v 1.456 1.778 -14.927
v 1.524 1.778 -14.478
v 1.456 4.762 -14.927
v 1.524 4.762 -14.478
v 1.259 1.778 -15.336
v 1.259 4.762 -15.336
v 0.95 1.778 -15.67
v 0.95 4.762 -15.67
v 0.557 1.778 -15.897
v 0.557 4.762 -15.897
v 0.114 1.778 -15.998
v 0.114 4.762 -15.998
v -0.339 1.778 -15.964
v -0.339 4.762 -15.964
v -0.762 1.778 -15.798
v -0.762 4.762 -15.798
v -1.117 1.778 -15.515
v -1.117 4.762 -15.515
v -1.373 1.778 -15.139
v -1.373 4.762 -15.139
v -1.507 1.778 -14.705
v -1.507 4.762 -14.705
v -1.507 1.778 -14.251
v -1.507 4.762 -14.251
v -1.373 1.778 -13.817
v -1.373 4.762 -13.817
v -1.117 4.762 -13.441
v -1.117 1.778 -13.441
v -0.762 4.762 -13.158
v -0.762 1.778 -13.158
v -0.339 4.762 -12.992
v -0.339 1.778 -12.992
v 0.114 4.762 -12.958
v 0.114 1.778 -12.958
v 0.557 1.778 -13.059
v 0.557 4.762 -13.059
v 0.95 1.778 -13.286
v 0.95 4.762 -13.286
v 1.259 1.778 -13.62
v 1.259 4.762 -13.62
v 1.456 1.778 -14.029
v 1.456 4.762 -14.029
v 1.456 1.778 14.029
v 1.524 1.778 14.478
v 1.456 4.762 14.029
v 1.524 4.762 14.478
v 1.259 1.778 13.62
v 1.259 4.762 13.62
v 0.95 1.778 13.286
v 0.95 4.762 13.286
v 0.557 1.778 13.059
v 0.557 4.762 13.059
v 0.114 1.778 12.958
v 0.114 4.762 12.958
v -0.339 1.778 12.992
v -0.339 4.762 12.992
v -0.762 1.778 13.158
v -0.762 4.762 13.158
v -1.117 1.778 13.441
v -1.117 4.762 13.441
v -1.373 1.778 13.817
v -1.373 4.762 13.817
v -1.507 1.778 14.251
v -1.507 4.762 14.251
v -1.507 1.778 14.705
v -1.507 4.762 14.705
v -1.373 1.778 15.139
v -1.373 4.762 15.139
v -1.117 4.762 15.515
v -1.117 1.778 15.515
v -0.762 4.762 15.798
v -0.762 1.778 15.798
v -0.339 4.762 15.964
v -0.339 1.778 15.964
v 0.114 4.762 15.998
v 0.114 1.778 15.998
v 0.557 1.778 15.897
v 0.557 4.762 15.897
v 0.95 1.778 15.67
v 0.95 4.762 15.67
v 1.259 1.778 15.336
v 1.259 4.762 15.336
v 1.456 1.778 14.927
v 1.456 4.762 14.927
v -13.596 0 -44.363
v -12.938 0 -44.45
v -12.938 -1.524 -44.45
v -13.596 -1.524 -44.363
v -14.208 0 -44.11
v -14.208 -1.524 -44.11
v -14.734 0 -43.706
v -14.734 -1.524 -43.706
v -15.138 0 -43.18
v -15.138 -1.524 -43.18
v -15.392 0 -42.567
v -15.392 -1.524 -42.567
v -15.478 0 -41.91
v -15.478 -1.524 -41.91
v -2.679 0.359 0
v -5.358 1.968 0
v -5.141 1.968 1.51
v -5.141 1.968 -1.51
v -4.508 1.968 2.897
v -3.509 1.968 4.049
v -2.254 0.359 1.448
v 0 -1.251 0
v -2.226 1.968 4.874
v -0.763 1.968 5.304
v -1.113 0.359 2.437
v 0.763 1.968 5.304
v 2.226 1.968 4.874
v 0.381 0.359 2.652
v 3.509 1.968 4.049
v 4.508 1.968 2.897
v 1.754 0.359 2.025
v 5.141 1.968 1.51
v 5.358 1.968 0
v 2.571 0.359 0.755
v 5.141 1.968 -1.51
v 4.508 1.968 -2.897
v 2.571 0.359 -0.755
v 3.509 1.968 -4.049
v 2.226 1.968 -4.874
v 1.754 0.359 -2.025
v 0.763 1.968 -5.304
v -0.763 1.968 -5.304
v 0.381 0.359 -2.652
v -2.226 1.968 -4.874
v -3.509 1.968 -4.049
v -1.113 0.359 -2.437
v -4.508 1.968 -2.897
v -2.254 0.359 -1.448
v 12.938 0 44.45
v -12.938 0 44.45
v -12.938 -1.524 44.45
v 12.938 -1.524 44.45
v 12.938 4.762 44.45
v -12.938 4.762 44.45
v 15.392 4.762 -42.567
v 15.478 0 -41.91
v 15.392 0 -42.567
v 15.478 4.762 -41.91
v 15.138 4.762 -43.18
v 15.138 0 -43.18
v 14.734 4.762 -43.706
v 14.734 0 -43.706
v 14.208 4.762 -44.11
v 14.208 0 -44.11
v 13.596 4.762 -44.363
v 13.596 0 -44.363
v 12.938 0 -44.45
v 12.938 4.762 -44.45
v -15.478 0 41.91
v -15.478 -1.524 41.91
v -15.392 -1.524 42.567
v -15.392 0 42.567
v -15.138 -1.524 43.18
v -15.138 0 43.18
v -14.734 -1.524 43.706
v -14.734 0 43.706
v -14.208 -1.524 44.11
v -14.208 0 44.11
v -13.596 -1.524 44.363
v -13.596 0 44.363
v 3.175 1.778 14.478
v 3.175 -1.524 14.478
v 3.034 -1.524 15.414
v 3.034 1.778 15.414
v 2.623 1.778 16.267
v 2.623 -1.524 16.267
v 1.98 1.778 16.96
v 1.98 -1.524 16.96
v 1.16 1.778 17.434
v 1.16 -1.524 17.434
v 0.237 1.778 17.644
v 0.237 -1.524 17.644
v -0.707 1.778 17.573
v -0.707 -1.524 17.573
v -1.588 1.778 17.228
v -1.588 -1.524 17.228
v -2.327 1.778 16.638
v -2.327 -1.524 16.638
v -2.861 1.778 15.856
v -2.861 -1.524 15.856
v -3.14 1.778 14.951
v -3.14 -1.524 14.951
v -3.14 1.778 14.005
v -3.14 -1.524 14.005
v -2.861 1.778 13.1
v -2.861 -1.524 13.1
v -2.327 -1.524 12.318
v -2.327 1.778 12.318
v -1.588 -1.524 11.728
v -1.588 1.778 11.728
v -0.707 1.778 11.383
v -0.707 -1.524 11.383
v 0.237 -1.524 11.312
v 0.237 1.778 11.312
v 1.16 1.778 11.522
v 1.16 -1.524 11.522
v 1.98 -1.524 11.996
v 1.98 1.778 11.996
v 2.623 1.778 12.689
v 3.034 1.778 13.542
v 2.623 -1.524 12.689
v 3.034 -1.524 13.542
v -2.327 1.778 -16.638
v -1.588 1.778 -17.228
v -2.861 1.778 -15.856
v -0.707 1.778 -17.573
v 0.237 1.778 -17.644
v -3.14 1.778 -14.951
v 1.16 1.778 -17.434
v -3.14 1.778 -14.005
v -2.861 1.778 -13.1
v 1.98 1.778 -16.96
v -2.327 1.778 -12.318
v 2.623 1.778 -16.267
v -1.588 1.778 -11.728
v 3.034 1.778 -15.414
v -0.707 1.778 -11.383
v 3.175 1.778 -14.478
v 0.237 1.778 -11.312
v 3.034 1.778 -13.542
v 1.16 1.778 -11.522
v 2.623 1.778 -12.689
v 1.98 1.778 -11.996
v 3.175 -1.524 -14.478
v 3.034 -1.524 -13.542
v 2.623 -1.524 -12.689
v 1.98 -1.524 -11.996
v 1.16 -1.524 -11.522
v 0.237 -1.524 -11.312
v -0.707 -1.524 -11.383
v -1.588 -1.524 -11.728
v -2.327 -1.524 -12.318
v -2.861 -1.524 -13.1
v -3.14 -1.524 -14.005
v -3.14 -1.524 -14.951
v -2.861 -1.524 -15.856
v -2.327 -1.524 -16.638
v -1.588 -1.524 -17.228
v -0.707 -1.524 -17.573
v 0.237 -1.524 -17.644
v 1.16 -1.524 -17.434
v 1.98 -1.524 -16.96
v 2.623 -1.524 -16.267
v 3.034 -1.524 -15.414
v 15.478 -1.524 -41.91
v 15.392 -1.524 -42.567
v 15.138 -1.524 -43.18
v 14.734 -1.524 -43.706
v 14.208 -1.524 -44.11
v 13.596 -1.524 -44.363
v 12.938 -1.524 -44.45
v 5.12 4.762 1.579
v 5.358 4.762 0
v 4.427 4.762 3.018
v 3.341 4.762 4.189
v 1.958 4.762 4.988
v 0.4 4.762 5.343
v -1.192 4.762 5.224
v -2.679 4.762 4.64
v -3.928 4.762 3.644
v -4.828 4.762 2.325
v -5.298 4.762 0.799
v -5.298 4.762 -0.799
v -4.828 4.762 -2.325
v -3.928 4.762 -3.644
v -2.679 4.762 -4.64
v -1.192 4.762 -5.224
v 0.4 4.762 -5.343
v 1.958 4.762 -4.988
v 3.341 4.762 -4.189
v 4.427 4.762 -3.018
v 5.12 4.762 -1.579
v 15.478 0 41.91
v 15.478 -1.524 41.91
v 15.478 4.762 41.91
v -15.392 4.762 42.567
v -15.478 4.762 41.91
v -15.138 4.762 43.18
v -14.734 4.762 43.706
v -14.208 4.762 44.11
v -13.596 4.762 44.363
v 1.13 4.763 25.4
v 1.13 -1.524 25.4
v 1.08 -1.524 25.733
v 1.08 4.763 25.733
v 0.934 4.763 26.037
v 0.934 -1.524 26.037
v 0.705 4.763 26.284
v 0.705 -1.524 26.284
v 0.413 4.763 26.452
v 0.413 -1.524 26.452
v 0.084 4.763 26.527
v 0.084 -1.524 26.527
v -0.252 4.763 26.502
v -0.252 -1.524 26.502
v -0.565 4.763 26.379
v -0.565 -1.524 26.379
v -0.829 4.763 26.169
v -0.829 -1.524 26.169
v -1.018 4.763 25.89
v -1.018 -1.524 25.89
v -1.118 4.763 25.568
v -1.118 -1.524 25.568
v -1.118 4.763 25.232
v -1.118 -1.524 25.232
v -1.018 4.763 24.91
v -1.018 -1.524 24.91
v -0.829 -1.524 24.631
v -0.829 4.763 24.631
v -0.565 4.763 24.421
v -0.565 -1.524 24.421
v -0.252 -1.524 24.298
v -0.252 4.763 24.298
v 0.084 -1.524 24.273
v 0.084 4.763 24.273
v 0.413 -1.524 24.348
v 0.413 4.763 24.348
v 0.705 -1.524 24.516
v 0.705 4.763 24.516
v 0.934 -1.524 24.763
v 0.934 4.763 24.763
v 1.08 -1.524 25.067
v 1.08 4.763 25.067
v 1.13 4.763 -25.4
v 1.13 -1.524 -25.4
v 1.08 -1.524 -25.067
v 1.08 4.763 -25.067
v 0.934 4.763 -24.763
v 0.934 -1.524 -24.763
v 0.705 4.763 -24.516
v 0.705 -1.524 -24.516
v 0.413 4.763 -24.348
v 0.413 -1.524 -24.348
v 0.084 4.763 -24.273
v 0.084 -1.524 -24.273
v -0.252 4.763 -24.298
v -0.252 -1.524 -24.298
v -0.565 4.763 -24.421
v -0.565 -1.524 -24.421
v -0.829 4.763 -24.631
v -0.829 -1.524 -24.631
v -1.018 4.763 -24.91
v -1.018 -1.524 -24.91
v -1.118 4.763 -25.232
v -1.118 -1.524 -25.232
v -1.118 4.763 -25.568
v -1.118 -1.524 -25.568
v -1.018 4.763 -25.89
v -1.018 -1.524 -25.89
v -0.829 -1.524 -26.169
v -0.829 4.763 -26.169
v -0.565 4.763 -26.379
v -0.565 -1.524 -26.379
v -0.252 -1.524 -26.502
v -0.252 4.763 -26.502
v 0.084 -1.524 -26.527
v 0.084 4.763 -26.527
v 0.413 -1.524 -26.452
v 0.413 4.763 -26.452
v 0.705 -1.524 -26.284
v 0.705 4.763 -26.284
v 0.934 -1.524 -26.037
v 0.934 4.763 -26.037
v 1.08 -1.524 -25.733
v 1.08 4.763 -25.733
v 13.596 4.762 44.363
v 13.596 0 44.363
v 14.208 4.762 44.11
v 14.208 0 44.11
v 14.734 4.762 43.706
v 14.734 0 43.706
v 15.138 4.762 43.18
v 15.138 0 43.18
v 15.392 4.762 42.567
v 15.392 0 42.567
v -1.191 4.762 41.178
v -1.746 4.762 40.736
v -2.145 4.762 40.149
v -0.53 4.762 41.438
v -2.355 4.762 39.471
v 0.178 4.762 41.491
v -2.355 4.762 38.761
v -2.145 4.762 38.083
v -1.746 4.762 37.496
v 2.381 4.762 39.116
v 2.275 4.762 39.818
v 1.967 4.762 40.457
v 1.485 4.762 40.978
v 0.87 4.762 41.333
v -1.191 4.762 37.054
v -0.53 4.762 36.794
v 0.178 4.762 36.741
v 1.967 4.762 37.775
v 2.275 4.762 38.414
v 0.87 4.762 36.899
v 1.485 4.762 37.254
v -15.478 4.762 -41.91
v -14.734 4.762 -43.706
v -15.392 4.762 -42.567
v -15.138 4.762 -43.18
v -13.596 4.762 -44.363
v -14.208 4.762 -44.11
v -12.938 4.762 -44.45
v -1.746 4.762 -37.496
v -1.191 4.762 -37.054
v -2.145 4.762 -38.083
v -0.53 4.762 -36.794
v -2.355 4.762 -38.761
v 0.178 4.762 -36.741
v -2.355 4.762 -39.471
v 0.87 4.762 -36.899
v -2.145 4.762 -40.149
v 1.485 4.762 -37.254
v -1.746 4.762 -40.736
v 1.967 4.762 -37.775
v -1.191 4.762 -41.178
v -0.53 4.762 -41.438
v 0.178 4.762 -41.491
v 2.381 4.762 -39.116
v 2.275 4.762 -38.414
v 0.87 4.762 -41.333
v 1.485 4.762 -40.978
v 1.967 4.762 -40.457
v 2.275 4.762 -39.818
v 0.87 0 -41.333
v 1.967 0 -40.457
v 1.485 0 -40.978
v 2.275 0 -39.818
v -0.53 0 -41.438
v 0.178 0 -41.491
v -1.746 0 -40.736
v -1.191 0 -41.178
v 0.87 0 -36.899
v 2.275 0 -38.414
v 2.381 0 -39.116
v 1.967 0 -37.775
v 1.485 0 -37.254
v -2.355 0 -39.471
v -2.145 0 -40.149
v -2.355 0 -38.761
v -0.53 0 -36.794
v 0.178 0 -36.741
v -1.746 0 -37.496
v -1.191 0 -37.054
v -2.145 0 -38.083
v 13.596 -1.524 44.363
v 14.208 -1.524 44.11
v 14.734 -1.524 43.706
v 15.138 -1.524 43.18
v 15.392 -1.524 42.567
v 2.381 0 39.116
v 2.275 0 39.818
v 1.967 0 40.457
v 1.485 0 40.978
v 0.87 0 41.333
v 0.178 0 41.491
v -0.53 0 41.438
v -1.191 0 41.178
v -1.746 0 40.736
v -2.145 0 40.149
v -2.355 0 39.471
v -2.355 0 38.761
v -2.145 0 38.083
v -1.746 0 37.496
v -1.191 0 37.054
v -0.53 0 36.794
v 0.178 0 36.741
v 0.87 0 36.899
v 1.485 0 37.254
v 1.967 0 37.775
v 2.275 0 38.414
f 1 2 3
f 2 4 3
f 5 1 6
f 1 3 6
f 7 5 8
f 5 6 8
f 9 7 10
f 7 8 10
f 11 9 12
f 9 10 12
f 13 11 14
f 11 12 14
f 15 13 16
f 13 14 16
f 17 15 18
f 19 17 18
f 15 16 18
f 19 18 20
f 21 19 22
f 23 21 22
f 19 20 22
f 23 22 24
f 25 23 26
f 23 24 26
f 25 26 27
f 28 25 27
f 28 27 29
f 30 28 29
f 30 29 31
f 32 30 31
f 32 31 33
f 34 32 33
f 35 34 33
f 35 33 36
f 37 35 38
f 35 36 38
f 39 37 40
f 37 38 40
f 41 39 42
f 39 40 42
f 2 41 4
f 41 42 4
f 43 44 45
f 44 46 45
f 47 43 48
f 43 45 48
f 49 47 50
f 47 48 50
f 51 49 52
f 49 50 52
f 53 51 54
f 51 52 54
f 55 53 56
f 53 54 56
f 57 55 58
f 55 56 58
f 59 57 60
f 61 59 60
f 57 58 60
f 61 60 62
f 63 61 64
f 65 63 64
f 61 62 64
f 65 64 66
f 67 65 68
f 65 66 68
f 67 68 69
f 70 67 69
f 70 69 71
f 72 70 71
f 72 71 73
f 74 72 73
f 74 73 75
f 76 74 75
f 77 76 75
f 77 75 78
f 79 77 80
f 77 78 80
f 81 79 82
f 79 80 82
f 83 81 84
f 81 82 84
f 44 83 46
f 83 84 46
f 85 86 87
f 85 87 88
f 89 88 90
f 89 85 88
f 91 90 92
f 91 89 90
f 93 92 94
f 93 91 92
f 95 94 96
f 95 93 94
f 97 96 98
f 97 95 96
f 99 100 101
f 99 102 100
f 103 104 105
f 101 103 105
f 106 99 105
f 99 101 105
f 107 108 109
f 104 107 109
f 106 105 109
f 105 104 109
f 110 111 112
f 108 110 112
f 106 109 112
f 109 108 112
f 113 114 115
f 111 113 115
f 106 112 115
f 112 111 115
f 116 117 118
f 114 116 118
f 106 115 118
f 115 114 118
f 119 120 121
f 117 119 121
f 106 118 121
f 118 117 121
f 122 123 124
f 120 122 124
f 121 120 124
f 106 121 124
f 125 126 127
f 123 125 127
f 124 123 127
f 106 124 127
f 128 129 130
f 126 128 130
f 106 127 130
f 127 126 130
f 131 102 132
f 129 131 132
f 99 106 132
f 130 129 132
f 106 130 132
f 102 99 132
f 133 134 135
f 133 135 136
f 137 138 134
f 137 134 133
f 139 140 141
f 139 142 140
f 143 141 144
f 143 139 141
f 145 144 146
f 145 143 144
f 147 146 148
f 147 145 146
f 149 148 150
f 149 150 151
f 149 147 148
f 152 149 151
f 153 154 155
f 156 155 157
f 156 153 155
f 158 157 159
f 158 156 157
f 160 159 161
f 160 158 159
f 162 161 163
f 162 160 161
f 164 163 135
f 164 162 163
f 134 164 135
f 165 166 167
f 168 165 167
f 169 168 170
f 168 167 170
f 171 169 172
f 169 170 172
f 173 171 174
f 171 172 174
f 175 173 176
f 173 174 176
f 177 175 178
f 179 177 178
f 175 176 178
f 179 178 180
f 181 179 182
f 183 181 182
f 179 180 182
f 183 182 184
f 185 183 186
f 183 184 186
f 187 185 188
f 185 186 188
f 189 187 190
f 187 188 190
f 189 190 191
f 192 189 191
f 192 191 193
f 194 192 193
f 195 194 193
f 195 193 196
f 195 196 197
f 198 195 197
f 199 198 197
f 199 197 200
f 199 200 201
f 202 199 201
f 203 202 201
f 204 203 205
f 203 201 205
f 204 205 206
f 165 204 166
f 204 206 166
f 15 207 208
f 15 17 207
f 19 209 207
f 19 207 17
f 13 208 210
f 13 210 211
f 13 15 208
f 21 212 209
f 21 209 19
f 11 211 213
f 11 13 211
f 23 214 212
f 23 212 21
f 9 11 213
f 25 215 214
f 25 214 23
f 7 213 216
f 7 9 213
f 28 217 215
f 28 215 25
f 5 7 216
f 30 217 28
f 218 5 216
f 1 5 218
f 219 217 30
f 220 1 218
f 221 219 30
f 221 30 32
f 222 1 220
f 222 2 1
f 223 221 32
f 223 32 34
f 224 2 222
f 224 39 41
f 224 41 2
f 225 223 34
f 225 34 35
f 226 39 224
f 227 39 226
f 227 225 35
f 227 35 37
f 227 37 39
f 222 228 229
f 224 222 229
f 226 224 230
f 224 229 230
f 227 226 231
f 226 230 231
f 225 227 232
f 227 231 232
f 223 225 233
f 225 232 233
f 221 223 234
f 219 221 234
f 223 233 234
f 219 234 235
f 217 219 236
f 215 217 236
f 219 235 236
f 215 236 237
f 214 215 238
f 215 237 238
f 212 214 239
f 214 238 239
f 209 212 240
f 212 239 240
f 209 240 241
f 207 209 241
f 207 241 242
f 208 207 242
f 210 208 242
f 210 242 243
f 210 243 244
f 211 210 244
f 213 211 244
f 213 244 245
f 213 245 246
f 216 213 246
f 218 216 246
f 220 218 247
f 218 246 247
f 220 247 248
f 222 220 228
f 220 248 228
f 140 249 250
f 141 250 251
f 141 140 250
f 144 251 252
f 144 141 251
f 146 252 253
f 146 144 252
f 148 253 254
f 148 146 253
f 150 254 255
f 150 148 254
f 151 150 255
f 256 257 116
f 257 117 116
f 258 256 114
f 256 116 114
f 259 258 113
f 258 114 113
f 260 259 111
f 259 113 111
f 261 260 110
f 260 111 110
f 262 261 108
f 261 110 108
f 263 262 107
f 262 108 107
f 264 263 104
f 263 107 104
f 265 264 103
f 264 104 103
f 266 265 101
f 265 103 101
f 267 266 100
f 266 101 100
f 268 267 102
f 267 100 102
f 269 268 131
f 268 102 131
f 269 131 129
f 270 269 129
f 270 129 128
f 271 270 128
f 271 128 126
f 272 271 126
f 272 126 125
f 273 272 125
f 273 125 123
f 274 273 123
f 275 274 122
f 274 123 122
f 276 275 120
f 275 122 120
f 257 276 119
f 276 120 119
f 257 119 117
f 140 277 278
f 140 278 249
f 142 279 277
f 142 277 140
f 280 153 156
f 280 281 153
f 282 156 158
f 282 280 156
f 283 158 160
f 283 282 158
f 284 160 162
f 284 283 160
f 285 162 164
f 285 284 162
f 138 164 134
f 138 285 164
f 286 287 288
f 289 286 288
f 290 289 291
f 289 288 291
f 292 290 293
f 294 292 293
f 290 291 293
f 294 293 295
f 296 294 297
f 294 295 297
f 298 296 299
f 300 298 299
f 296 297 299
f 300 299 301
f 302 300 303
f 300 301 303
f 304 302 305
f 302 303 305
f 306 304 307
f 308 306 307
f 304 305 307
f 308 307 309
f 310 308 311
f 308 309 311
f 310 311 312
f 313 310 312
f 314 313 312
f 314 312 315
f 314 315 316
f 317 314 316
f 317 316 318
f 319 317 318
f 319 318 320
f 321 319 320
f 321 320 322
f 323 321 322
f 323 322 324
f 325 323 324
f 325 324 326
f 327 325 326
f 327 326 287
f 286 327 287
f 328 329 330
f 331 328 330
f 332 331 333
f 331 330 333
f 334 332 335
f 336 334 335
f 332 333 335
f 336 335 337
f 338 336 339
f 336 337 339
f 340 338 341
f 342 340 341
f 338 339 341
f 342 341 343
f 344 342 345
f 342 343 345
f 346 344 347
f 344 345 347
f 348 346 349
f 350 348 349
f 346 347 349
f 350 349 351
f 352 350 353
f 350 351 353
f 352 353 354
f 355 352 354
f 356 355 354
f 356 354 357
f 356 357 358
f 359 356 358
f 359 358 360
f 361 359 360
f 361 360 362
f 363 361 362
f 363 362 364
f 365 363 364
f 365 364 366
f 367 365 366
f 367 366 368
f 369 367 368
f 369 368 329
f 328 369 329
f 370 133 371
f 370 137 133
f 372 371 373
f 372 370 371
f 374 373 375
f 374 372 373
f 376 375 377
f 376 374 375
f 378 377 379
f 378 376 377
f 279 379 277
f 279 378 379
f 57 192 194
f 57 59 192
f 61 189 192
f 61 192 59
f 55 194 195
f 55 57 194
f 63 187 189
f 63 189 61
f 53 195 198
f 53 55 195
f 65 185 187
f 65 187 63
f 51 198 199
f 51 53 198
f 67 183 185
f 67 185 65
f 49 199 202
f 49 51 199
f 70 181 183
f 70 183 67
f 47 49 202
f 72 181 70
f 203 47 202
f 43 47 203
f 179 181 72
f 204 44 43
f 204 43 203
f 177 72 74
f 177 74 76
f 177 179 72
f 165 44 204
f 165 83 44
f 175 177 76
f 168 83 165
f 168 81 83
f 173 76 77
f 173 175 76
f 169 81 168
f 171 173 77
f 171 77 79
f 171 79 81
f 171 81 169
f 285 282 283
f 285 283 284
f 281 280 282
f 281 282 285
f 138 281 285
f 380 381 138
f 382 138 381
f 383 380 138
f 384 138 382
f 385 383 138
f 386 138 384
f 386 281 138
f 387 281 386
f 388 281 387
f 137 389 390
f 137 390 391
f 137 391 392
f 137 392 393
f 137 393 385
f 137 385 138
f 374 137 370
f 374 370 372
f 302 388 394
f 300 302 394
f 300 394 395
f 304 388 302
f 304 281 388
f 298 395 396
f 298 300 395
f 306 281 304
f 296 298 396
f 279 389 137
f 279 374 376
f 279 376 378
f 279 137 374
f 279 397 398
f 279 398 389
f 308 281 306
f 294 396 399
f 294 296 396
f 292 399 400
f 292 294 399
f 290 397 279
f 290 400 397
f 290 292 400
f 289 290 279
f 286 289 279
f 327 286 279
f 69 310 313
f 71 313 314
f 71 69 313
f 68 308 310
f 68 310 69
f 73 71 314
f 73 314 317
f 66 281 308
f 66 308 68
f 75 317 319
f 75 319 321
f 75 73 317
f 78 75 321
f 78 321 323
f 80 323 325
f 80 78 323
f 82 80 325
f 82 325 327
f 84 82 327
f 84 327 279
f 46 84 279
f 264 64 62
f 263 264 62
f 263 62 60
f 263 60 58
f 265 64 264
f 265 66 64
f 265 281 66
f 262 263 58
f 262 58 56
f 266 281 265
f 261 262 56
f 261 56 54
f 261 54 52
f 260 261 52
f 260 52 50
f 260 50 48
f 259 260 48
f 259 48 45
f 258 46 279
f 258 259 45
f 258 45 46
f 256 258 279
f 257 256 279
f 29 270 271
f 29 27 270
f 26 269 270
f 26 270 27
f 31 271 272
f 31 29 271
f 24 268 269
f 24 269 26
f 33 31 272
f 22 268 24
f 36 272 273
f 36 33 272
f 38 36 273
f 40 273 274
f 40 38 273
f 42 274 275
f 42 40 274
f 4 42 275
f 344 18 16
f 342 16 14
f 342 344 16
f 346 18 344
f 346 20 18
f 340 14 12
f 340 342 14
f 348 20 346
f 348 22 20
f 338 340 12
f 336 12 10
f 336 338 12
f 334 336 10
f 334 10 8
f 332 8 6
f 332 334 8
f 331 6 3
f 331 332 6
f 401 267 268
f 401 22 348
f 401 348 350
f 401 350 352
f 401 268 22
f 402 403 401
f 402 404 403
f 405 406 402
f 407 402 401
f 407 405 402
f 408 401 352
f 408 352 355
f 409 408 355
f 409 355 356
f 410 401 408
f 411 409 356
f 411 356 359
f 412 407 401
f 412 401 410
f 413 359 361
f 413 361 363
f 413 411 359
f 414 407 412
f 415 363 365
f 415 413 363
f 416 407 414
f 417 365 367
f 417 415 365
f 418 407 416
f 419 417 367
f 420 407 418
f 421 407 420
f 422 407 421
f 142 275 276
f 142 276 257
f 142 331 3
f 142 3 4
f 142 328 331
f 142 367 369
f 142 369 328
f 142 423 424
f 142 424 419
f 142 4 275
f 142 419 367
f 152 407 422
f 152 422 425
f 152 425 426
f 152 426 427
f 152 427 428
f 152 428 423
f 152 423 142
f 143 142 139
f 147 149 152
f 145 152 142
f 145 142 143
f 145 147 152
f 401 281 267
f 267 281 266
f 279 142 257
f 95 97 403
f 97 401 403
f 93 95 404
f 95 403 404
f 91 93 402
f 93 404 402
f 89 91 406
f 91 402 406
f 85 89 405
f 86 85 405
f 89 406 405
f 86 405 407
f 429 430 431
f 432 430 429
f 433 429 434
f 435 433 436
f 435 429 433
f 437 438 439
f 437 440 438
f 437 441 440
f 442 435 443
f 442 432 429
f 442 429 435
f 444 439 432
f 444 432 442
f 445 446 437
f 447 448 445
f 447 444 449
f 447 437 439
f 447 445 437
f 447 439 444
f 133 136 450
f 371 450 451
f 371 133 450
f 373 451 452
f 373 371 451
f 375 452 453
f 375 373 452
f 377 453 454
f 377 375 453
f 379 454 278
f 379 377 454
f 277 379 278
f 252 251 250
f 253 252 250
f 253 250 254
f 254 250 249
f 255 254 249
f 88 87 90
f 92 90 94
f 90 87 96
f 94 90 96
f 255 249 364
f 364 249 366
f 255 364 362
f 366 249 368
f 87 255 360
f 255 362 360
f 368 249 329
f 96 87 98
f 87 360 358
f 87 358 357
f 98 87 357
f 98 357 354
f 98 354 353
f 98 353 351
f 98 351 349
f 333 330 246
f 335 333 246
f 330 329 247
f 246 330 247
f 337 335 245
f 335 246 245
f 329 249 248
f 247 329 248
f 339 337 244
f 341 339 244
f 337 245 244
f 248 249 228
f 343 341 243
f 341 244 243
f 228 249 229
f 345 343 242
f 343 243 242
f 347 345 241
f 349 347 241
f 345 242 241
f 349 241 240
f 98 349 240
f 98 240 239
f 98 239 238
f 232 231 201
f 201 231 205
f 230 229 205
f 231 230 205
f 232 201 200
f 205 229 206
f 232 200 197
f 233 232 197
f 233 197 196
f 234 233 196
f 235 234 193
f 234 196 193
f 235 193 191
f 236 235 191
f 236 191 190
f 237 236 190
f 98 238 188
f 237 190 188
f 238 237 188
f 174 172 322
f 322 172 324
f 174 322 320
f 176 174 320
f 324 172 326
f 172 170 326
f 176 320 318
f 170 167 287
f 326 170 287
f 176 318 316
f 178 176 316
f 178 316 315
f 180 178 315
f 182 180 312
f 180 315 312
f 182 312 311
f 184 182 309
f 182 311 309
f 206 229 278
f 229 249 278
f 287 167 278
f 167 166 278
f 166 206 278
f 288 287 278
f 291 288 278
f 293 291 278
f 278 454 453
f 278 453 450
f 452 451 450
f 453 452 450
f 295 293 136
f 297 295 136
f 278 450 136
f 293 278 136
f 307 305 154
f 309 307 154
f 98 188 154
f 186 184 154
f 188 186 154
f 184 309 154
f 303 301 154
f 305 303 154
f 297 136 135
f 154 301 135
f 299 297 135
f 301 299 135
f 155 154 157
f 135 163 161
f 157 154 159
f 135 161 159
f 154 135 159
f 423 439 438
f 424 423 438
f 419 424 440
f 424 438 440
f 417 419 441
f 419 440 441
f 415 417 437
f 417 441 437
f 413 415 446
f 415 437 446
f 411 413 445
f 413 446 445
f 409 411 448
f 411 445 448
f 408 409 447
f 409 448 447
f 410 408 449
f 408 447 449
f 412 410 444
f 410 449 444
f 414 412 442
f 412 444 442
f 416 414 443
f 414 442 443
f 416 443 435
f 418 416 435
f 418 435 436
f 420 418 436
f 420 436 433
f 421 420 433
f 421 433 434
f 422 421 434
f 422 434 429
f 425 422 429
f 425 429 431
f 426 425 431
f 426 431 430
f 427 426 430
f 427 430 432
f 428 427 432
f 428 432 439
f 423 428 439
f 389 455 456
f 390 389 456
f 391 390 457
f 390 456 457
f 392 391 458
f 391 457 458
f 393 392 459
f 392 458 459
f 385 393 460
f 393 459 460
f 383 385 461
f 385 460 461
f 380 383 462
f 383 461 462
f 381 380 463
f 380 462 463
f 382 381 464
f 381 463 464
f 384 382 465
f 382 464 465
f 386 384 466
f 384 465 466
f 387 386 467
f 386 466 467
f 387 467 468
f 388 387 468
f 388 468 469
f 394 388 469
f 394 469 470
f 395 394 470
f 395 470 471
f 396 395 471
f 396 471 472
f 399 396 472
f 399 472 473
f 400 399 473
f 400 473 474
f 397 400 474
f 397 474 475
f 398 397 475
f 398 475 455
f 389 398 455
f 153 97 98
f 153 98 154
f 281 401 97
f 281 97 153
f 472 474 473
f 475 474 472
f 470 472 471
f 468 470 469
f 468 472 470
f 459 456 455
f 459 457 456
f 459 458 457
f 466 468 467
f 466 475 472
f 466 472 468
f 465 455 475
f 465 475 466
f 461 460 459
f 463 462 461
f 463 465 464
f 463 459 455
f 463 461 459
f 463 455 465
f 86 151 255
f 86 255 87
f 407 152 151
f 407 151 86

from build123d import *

# Parameters (mm, degrees)
SKETCH1_W                   = 30.95625
SKETCH1_H                   = 88.9
BOSS_EXTRUDE1_DEPTH         = 4.7625
FILLET1_R                   = 2.54
SKETCH6_R                   = 1.524
CUT_EXTRUDE1_DEPTH          = 5.7625
SKETCH7_R                   = 2.38125
CUT_EXTRUDE2_DEPTH          = 5.7625
BOSS_EXTRUDE3_DEPTH         = 1.524
F_4_40_TAPPED_HOLE1_D       = 2.2606
SKETCH10_R                  = 1.524
CUT_EXTRUDE3_DEPTH          = 2.524
SKETCH11_R                  = 3.175
CUT_EXTRUDE4_DEPTH          = 3.302
F_1_2_13_TAPPED_HOLE2_D     = 10.71626
F_1_2_13_TAPPED_HOLE2_DEPTH = 2.794
F_1_2_13_TAPPED_HOLE2_TIP   = 3.219489309


with BuildPart() as part:
    # Sketch1 → Boss-Extrude1 (new body)
    with BuildSketch(Plane(origin=(0, 0, 0), x_dir=(1, 0, 0), z_dir=(0, 1, 0))):
        Rectangle(SKETCH1_W, SKETCH1_H)
    extrude(amount=BOSS_EXTRUDE1_DEPTH)

    # Fillet1
    fillet1_edges = [part.edges().sort_by_distance(p)[0] for p in [
        (15.478125, 2.38125, -44.45),
        (15.478125, 2.38125, 44.45),
        (-15.478125, 2.38125, 44.45),
        (-15.478125, 2.38125, -44.45),
    ]]
    fillet(fillet1_edges, radius=FILLET1_R)

    # Sketch6 → Cut-Extrude1 (cut, through all)
    with BuildSketch(Plane.XZ):
        with Locations((0, 14.478)):
            Circle(SKETCH6_R)
        with Locations((0, -14.478)):
            Circle(SKETCH6_R)
    extrude(amount=-CUT_EXTRUDE1_DEPTH, mode=Mode.SUBTRACT)

    # Sketch7 → Cut-Extrude2 (cut, through all)
    with BuildSketch(Plane.XZ):
        with Locations((0, -39.116)):
            Circle(SKETCH7_R)
        with Locations((0, 39.116)):
            Circle(SKETCH7_R)
    extrude(amount=-CUT_EXTRUDE2_DEPTH, mode=Mode.SUBTRACT)

    # Sketch9 → Boss-Extrude3 (add)
    with BuildSketch(Plane.XZ):
        with BuildLine():
            Line((12.938125, -44.45), (-12.938125, -44.45))
            ThreePointArc((-12.938125, -44.45), (-14.734176224, -43.706051224), (-15.478125, -41.91))
            Line((-15.478125, -41.91), (-15.478125, 41.91))
            ThreePointArc((-15.478125, 41.91), (-14.734176224, 43.706051224), (-12.938125, 44.45))
            Line((-12.938125, 44.45), (12.938125, 44.45))
            ThreePointArc((12.938125, 44.45), (14.734176224, 43.706051224), (15.478125, 41.91))
            Line((15.478125, 41.91), (15.478125, -41.91))
            ThreePointArc((15.478125, -41.91), (14.734176224, -43.706051224), (12.938125, -44.45))
        make_face()
    extrude(amount=BOSS_EXTRUDE3_DEPTH)

    # #4-40 Tapped Hole1 (through all)
    with Locations(Plane(origin=(0, 4.7625, 0), x_dir=(-1, 0, 0), z_dir=(0, 1, 0))):
        with Locations((0, 25.4), (0, -25.4)):
            Hole(F_4_40_TAPPED_HOLE1_D / 2)

    # Sketch10 → Cut-Extrude3 (cut, through all)
    with BuildSketch(Plane(origin=(0, 0, 0), x_dir=(1, 0, 0), z_dir=(0, 1, 0))):
        with Locations((0, -14.478)):
            Circle(SKETCH10_R)
        with Locations((0, 14.478)):
            Circle(SKETCH10_R)
    extrude(amount=-CUT_EXTRUDE3_DEPTH, mode=Mode.SUBTRACT)

    # Sketch11 → Cut-Extrude4 (cut)
    with BuildSketch(Plane.XZ.offset(1.524)):
        with Locations((0, -14.478)):
            Circle(SKETCH11_R)
        with Locations((0, 14.478)):
            Circle(SKETCH11_R)
    extrude(amount=-CUT_EXTRUDE4_DEPTH, mode=Mode.SUBTRACT)

    # 1/2-13 Tapped Hole2
    with Locations(Plane(origin=(0, 4.7625, 0), x_dir=(-1, 0, 0), z_dir=(0, 1, 0))):
        with Locations((0, 0)):
            Hole(F_1_2_13_TAPPED_HOLE2_D / 2, depth=F_1_2_13_TAPPED_HOLE2_DEPTH)
            with Locations((0, 0, -(F_1_2_13_TAPPED_HOLE2_DEPTH + F_1_2_13_TAPPED_HOLE2_TIP / 2))):  # 118° drill point
                Cone(0, F_1_2_13_TAPPED_HOLE2_D / 2, F_1_2_13_TAPPED_HOLE2_TIP, mode=Mode.SUBTRACT)


solid = part.part
